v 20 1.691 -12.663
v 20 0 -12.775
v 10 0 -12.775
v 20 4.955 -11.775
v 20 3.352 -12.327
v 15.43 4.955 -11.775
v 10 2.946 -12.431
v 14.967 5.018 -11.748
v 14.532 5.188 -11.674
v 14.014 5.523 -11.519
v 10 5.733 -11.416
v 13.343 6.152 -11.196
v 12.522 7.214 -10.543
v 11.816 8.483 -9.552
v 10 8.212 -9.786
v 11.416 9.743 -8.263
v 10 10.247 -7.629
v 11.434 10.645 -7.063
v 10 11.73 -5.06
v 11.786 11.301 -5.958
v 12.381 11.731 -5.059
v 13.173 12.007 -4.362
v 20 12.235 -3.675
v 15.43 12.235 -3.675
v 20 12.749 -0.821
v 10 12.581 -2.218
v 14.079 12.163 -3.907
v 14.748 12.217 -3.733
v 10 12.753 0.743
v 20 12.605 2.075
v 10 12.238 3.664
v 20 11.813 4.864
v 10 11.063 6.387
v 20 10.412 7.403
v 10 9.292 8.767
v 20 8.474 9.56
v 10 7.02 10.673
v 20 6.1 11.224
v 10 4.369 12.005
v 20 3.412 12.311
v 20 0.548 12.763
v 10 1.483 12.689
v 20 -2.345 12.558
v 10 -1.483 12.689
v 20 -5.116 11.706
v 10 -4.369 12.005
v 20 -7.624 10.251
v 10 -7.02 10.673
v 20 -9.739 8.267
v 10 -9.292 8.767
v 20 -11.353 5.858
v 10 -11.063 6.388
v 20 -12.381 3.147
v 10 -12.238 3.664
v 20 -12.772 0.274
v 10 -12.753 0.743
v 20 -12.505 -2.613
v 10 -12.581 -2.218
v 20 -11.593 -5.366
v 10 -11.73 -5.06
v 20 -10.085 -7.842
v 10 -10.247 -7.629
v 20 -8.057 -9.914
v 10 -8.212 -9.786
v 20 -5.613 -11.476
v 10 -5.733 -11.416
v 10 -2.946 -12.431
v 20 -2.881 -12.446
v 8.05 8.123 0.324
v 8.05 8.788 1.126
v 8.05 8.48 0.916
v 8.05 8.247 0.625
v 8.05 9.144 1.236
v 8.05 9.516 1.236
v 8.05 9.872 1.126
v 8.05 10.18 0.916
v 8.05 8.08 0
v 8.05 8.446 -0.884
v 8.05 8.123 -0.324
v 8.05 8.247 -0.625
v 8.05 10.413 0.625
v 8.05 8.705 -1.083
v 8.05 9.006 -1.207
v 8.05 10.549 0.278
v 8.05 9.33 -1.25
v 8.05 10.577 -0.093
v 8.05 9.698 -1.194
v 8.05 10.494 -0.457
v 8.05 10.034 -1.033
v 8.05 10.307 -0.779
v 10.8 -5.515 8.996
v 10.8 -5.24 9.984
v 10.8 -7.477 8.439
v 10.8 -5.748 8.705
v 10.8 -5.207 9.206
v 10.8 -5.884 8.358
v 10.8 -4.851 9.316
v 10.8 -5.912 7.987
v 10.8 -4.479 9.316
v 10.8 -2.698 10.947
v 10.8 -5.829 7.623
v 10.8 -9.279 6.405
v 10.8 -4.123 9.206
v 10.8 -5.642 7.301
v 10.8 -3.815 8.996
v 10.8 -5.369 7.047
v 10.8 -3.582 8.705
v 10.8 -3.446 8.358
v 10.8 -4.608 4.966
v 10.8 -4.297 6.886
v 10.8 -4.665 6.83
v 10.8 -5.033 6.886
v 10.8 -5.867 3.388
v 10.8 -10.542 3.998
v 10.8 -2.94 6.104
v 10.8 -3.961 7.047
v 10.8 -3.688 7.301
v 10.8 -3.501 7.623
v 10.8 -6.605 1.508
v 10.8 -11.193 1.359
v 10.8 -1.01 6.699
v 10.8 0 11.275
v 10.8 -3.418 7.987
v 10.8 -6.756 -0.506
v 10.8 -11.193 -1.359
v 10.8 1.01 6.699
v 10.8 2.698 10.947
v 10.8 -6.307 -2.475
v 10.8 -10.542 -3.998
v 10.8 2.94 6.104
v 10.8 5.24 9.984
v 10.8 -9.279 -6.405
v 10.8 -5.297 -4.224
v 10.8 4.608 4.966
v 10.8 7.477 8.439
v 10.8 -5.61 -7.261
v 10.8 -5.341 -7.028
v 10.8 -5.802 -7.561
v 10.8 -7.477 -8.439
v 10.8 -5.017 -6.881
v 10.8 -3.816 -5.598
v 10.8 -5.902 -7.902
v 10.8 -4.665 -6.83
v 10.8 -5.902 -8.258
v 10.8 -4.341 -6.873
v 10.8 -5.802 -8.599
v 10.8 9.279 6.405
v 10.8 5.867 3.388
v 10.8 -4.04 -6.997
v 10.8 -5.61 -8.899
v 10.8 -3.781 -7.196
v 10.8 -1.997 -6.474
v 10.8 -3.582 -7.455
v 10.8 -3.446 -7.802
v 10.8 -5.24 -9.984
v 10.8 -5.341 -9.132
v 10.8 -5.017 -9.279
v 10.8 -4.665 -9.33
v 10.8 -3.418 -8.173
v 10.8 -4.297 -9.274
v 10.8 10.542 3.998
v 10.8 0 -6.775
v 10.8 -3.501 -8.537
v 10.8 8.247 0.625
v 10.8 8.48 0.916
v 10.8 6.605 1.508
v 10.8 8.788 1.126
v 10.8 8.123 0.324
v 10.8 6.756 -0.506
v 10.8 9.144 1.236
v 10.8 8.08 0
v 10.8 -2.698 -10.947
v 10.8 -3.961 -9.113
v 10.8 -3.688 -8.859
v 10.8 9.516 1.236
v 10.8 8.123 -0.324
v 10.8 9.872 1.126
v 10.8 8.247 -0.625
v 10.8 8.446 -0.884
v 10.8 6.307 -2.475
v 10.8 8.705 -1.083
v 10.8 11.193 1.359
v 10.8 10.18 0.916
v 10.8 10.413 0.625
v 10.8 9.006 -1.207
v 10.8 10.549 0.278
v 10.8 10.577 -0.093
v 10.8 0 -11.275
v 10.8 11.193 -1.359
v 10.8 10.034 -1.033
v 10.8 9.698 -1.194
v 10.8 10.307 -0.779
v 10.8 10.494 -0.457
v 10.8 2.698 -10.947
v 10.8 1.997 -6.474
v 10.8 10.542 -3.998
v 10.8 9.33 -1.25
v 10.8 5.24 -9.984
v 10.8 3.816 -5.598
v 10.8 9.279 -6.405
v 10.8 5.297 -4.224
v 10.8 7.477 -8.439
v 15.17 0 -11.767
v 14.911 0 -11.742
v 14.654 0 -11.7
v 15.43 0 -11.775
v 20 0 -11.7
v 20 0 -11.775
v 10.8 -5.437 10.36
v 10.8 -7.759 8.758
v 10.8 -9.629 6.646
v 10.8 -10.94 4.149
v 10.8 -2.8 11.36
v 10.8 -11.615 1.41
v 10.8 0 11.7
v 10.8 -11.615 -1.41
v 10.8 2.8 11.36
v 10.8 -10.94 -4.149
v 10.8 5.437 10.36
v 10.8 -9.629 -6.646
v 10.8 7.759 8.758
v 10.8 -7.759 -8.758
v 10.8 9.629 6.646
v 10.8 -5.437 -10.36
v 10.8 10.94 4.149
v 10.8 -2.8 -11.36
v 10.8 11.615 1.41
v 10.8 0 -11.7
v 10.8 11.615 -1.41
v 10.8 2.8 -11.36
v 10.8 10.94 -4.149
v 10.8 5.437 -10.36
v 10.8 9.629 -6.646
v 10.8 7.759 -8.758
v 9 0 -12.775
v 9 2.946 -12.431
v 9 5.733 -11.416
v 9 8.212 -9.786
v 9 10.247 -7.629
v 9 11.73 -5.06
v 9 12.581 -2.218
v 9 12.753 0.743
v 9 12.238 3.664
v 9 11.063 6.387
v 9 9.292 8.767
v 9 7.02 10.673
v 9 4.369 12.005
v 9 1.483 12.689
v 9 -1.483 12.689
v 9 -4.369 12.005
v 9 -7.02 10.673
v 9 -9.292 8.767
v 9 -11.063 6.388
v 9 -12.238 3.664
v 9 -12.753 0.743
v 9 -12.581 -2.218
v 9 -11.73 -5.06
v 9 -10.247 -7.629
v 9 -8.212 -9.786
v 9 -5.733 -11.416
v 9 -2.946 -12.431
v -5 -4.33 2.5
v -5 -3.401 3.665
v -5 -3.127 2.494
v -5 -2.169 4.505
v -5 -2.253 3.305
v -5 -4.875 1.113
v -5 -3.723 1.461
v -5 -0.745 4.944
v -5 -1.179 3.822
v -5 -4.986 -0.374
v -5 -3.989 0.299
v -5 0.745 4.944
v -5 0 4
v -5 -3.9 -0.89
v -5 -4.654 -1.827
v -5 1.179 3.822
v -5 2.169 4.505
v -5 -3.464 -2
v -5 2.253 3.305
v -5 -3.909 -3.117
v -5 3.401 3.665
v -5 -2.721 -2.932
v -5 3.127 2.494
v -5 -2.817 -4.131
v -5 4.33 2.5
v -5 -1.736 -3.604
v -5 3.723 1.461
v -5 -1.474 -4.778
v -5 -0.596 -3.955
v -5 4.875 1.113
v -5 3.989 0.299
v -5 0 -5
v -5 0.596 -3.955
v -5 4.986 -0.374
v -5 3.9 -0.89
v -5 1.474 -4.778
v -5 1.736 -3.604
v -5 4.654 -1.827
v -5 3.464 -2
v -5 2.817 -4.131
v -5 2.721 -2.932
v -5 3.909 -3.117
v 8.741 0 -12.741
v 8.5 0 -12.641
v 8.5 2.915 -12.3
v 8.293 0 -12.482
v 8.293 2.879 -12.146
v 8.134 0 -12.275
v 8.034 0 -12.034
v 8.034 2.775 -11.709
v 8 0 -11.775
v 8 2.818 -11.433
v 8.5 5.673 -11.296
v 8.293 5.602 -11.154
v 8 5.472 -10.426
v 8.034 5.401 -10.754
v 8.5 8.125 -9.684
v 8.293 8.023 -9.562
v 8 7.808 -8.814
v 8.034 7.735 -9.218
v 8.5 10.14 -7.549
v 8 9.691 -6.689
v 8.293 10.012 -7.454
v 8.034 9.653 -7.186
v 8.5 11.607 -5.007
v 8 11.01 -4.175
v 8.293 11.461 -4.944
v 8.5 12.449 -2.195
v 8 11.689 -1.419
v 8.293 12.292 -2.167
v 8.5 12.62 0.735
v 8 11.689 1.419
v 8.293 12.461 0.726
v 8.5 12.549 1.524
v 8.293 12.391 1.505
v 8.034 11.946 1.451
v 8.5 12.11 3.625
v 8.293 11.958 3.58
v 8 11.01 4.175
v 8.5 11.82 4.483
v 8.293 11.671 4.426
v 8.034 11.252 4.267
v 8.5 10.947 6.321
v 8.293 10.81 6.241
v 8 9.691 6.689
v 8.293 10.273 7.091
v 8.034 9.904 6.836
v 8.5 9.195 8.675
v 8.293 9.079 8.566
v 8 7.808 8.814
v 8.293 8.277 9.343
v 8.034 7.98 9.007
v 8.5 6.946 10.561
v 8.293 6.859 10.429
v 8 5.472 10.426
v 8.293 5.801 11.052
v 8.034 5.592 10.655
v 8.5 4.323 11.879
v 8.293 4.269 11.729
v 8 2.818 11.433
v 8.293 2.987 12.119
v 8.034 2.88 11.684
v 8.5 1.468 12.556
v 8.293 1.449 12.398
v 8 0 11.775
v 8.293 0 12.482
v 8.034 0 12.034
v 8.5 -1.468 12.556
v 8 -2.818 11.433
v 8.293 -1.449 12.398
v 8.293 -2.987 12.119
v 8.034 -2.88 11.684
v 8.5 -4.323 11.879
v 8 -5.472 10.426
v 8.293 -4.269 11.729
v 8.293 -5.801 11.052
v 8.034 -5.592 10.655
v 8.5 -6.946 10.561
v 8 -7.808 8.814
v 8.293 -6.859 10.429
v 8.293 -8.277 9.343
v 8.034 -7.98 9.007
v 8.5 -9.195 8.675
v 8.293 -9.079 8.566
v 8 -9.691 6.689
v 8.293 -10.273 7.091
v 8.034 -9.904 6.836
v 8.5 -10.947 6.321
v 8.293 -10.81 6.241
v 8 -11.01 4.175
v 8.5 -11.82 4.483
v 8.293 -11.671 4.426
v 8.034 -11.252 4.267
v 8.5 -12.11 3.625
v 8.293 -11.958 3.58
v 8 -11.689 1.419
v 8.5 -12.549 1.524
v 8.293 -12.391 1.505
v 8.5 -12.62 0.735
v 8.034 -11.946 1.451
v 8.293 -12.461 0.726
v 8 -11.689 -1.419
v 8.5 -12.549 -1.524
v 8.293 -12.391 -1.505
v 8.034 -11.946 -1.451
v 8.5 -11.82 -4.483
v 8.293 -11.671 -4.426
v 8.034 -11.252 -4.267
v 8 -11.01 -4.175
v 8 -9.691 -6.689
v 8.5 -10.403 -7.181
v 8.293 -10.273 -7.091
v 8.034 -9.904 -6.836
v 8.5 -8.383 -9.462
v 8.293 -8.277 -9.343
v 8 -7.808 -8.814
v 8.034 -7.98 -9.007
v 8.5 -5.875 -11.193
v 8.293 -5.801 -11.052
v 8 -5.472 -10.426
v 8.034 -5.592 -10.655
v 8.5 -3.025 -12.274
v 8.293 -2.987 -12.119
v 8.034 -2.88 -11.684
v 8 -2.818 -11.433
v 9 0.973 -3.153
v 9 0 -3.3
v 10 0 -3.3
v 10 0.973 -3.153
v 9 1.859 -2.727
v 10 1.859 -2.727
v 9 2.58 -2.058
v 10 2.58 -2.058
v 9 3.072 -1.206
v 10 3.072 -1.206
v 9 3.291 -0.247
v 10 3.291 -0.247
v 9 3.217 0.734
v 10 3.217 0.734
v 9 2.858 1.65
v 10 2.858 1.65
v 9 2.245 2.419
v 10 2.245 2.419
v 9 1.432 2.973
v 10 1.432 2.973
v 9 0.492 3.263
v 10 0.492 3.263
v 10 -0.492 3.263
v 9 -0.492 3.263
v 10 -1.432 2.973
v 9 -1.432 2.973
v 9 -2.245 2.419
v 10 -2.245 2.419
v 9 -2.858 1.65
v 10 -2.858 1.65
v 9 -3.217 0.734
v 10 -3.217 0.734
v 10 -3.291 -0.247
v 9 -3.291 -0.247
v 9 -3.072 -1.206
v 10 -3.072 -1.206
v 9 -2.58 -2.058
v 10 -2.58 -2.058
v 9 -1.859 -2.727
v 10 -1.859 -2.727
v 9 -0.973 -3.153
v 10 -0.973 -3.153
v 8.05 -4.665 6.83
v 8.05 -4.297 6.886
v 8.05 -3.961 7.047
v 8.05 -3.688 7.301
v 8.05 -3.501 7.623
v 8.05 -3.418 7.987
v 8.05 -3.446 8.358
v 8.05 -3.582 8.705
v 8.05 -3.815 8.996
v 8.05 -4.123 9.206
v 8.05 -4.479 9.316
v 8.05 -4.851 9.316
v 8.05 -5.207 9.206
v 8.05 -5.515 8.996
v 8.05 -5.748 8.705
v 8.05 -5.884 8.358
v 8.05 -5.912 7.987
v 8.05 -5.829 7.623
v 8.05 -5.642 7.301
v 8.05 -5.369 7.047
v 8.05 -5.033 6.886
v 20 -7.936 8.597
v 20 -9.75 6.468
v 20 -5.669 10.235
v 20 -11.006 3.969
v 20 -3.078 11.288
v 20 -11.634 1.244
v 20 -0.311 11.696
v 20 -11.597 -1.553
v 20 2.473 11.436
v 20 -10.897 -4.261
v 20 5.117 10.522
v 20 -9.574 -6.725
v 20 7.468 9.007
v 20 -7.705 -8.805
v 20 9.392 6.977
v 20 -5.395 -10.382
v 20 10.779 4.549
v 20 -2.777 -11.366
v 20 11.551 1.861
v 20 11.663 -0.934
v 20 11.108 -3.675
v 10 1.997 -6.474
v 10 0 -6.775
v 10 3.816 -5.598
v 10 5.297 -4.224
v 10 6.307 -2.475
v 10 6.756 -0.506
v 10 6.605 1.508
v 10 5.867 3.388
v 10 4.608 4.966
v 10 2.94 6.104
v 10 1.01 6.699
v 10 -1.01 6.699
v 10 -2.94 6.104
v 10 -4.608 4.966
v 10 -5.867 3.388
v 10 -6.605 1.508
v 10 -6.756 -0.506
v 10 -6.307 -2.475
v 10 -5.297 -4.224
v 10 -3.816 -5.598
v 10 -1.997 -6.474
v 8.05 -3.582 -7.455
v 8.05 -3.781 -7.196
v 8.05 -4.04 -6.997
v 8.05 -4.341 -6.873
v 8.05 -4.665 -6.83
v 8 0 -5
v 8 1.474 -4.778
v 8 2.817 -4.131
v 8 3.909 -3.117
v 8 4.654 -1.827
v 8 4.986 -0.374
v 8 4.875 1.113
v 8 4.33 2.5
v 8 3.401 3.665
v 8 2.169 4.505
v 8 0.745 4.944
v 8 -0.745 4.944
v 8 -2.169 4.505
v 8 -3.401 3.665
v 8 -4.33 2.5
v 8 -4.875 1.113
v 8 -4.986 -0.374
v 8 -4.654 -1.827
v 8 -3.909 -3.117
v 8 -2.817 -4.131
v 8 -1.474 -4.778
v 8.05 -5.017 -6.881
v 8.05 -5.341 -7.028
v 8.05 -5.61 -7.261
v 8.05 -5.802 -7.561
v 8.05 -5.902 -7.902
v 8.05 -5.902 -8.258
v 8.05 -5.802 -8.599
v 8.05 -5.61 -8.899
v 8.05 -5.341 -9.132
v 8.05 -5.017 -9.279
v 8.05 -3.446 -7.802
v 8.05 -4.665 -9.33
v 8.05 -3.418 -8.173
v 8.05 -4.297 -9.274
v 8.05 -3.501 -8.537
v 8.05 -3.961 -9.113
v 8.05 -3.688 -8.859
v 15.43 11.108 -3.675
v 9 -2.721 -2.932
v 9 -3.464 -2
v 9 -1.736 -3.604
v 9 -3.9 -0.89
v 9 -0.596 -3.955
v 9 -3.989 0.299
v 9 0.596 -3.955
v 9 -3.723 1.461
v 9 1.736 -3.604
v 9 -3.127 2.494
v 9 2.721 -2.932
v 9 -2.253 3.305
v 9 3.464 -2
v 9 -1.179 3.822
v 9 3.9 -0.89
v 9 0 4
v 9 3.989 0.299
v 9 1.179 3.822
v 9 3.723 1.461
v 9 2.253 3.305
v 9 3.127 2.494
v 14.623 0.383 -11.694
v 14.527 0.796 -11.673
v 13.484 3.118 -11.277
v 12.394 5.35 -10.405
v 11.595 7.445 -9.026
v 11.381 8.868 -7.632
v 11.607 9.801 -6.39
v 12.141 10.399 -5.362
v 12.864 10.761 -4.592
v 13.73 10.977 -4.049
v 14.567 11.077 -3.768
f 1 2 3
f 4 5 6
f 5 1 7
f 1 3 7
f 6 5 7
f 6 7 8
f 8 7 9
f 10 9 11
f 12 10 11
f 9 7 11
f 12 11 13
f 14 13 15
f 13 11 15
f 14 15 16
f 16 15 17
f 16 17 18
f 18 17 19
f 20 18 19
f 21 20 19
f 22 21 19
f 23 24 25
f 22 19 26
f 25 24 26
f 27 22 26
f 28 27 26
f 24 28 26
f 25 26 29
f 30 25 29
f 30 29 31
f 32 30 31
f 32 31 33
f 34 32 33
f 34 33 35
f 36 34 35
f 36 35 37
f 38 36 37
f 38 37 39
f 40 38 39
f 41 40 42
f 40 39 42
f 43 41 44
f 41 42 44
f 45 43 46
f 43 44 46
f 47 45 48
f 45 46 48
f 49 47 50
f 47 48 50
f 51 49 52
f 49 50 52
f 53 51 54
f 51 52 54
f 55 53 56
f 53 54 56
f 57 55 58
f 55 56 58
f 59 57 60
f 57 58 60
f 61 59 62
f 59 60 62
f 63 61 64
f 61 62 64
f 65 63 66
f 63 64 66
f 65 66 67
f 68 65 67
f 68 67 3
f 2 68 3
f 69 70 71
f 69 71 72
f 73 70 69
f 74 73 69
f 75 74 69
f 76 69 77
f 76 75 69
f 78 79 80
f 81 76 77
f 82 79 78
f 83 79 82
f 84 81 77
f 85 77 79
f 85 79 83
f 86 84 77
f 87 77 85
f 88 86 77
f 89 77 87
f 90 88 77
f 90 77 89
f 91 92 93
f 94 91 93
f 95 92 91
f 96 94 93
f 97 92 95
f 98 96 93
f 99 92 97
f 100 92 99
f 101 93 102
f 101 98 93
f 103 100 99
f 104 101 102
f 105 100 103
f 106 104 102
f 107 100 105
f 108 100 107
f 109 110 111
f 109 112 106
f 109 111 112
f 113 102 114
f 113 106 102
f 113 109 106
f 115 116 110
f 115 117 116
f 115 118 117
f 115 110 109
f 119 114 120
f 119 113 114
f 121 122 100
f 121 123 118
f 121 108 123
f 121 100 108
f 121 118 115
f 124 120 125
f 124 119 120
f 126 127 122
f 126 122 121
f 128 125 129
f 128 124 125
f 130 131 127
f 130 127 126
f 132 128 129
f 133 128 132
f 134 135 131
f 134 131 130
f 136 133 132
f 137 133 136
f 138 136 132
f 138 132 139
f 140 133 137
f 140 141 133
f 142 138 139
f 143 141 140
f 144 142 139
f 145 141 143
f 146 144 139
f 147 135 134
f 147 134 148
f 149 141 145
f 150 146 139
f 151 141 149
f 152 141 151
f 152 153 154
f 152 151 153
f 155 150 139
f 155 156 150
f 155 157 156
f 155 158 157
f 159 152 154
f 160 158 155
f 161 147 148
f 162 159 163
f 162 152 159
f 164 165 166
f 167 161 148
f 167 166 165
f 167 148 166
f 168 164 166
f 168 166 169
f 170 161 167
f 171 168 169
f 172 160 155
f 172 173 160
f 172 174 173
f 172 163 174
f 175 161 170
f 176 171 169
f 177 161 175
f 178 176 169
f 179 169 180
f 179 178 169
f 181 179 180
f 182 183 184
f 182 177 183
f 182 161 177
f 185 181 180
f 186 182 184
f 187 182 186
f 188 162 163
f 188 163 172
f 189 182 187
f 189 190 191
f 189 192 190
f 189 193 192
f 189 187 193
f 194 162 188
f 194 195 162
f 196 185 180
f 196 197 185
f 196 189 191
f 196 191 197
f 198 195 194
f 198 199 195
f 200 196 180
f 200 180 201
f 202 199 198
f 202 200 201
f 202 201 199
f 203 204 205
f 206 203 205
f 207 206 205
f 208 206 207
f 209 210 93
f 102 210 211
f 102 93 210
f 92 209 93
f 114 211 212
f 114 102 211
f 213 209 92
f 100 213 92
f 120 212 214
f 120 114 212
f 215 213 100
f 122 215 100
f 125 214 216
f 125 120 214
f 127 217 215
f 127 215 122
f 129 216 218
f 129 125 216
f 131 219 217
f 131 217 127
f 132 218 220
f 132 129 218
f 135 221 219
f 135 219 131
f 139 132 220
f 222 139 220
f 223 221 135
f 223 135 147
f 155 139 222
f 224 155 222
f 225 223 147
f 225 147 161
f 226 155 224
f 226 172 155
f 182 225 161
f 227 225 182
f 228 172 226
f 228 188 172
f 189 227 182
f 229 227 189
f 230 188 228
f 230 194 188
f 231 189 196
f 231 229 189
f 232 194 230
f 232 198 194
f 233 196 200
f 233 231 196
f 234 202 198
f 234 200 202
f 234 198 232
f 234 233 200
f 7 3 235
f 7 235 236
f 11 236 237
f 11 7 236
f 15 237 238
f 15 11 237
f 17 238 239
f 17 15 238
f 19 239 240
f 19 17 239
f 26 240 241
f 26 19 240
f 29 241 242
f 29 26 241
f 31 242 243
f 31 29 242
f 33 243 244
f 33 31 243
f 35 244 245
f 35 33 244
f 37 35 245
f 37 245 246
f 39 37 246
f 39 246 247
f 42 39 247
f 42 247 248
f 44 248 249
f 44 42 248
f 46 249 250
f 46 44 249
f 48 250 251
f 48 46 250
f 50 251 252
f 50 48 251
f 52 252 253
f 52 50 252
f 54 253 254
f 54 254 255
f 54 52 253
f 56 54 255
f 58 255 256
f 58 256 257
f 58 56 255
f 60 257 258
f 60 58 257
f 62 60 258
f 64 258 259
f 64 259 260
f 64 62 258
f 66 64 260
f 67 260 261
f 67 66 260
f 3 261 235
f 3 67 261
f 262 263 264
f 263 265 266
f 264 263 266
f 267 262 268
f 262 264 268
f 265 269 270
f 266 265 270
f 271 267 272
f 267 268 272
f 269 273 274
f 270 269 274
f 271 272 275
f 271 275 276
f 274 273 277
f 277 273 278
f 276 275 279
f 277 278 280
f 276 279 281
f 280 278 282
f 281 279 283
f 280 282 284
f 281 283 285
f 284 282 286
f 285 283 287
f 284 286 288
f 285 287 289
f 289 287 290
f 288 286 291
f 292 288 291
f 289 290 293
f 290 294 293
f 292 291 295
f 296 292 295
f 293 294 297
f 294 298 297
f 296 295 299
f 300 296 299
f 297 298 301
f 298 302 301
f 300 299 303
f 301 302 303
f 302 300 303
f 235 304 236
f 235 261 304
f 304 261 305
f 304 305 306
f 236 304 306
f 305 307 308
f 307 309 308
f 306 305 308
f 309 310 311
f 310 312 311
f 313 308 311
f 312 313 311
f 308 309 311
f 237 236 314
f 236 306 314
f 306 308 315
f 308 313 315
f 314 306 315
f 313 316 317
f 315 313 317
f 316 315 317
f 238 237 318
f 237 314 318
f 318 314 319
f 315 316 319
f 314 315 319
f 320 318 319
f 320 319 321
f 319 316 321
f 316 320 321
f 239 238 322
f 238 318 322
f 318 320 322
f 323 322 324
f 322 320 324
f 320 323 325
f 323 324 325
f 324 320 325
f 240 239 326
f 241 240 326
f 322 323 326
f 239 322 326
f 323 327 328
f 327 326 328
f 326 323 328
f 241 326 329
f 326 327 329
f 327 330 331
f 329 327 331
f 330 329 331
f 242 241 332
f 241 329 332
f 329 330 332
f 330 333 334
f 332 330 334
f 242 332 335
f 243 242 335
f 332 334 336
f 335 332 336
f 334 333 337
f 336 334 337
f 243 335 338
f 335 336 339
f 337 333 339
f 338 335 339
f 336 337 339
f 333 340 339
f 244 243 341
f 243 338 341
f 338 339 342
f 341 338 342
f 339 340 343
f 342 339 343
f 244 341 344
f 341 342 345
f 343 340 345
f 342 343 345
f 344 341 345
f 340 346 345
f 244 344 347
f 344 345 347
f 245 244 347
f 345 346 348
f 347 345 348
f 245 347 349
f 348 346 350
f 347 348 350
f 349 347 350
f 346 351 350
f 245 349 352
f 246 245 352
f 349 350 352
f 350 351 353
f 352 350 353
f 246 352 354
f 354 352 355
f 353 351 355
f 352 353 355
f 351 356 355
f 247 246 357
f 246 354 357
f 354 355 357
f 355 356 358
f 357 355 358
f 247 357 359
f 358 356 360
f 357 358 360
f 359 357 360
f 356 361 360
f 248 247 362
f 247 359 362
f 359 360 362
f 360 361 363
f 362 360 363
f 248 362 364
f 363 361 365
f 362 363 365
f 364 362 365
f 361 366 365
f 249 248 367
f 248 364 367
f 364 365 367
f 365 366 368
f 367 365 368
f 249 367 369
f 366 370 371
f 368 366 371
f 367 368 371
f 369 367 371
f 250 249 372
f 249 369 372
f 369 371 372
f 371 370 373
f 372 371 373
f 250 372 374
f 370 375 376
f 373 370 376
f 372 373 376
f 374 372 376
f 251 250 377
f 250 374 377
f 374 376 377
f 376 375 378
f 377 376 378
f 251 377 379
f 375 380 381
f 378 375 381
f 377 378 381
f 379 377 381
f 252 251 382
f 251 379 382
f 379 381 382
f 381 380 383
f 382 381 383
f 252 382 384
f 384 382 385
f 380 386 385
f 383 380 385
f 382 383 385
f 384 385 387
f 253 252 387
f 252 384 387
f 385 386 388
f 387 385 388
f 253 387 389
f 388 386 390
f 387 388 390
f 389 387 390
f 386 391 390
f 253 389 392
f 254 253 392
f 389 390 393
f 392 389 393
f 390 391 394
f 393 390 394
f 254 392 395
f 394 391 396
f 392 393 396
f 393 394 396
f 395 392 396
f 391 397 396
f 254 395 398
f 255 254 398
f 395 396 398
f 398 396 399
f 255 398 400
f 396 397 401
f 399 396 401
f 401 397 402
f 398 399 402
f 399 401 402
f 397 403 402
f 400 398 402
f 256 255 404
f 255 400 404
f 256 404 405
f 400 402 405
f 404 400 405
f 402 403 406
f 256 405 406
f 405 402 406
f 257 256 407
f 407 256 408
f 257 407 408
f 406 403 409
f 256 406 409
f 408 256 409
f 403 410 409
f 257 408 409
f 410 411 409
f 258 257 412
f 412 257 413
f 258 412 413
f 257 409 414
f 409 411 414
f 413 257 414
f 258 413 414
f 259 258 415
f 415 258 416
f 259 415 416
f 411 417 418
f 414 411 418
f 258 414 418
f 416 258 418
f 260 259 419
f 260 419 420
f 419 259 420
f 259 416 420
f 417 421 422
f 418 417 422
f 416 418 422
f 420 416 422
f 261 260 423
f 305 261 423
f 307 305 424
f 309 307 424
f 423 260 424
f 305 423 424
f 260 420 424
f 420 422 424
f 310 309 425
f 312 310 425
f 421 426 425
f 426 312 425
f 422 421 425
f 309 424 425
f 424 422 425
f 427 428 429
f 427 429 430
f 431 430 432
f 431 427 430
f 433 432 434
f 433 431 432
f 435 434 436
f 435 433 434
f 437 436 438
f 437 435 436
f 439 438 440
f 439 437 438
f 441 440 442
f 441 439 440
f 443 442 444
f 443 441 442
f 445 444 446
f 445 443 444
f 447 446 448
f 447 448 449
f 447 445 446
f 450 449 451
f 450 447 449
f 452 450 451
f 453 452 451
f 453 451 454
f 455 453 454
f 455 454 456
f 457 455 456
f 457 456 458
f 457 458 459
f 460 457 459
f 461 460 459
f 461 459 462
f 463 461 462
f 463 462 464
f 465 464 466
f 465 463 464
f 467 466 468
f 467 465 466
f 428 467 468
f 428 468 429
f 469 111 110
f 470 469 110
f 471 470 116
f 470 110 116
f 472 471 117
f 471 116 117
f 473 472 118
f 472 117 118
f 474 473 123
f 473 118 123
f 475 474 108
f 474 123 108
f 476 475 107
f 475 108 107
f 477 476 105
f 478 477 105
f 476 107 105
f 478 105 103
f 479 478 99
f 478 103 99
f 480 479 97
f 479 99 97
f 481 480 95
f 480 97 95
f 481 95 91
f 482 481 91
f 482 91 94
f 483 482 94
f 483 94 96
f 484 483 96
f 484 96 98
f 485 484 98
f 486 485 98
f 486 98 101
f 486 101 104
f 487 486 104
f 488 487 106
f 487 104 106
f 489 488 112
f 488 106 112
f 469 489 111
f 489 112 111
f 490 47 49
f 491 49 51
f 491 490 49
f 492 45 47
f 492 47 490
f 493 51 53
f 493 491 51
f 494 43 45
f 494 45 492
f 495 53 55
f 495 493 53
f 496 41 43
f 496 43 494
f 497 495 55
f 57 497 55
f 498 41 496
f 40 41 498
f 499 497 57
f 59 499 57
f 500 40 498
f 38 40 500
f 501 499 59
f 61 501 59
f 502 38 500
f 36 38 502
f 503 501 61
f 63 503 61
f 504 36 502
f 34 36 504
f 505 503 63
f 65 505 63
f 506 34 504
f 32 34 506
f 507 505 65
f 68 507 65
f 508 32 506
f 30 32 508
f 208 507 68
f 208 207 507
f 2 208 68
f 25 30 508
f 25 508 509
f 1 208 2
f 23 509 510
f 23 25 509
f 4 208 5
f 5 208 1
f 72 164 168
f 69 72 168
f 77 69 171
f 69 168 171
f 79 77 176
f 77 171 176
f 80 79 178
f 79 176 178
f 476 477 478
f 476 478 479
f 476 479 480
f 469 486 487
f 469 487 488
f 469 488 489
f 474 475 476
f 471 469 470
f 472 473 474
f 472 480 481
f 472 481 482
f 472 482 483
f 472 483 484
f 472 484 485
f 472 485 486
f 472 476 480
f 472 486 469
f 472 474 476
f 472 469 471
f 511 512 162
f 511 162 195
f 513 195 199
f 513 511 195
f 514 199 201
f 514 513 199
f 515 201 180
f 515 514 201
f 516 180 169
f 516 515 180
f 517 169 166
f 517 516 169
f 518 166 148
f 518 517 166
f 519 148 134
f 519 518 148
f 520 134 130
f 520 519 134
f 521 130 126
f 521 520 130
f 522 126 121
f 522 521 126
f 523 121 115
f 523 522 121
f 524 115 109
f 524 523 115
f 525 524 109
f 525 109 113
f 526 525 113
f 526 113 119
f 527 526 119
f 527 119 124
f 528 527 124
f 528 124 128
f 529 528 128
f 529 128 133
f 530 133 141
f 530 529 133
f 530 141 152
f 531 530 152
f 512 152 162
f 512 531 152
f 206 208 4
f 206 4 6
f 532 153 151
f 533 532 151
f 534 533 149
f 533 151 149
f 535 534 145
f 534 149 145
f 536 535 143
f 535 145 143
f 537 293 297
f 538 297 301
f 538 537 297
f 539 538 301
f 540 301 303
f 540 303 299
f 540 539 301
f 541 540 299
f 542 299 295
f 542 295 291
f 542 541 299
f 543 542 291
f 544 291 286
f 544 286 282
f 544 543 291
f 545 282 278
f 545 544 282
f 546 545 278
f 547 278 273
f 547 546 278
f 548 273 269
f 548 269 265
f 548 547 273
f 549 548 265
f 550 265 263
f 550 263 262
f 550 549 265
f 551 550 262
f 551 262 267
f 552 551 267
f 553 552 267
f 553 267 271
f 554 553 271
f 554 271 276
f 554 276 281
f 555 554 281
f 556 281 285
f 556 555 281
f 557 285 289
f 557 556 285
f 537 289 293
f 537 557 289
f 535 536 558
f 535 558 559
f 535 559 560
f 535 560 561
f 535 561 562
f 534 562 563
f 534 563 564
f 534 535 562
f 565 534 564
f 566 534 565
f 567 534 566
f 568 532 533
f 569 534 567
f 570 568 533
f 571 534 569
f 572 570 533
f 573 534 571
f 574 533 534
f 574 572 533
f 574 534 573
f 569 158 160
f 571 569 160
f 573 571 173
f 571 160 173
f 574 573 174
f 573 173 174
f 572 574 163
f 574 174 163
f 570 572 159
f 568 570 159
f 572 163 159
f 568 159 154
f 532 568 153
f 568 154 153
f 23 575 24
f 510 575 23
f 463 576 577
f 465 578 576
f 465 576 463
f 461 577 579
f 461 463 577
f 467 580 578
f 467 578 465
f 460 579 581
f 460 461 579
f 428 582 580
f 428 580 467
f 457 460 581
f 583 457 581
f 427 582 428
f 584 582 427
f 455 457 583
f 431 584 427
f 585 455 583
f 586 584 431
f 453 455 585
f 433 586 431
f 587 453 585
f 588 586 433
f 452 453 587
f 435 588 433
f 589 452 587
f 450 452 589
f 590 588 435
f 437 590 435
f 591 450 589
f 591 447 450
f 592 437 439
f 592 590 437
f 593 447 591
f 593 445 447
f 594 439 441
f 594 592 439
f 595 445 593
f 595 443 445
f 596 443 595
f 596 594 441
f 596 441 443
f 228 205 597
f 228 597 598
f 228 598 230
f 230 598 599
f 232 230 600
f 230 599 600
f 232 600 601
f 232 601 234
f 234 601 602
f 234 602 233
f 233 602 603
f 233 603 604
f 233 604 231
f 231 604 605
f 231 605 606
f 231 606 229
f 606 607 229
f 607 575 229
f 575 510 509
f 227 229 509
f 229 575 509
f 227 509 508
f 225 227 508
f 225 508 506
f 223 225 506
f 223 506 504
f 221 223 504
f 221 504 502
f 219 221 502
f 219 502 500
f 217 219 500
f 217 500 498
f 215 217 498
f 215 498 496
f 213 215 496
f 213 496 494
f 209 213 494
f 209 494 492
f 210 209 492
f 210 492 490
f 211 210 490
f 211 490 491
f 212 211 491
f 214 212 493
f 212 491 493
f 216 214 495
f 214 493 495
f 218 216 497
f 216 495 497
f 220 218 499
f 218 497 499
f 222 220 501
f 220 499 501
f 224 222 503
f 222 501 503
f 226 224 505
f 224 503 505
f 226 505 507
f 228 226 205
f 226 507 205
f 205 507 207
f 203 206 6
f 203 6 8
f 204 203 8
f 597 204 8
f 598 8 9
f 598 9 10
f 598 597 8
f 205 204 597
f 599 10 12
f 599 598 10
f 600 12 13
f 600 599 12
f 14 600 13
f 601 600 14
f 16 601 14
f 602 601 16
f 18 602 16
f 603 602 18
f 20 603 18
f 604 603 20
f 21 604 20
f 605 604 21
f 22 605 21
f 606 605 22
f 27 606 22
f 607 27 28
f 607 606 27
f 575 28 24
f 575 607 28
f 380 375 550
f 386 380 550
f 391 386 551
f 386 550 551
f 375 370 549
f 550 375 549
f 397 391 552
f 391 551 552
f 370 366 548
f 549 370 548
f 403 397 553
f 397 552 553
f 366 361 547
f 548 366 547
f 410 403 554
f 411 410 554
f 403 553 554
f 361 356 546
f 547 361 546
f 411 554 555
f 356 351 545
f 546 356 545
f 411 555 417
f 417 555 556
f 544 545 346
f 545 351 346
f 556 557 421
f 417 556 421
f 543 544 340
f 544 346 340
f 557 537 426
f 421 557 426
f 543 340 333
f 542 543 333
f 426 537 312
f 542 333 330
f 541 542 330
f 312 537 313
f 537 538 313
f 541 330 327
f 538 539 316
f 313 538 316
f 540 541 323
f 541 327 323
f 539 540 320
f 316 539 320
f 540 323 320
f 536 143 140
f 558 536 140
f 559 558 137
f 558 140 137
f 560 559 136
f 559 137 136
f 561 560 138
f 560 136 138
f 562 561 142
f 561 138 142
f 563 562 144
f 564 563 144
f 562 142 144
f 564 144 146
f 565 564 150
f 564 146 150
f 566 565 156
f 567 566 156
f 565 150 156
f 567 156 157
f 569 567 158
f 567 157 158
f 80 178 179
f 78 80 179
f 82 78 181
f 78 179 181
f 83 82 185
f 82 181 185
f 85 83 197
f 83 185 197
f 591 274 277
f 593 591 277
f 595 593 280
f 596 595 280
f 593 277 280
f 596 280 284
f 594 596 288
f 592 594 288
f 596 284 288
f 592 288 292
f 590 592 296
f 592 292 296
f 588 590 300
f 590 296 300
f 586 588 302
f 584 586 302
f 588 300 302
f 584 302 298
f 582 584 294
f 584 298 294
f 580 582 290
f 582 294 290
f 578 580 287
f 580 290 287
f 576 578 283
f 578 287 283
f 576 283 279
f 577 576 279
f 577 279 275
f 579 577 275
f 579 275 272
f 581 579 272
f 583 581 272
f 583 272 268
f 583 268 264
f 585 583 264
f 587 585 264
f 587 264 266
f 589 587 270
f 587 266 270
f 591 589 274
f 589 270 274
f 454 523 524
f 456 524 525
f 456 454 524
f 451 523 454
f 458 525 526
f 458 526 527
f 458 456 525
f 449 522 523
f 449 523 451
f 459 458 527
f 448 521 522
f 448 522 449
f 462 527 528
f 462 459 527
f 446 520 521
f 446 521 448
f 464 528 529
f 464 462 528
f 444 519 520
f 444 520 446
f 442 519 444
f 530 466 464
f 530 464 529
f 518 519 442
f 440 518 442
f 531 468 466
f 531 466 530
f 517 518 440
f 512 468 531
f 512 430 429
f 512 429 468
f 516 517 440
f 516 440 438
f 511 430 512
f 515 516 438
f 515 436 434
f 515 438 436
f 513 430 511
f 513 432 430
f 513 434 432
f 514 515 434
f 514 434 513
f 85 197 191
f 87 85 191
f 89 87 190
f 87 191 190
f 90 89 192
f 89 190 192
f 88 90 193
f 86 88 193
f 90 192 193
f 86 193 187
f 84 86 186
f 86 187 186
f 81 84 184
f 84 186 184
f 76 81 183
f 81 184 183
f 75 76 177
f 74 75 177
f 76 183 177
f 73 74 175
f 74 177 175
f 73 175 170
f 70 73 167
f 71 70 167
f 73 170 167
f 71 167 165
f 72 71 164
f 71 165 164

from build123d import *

# Parameters (mm, degrees)
SKETCH3_R                = 5
SKETCH3_R_2              = 3.3
BOSS_EXTRUDE3_DEPTH      = 10
BOSS_EXTRUDE3_DEPTH_BACK = 5
SKETCH10_R               = 12.775
SKETCH10_R_2             = 3.65
BOSS_EXTRUDE5_DEPTH      = 2
SKETCH11_R               = 11.275
SKETCH11_R_2             = 6.775
BOSS_EXTRUDE6_DEPTH      = 0.8
SKETCH12_R               = 1.25
CUT_EXTRUDE2_DEPTH       = 2.75
FILLET3_R                = 1
SKETCH13_R               = 12.775
SKETCH13_R_2             = 11.275
BOSS_EXTRUDE7_DEPTH      = 10
SKETCH14_R               = 11.7
CUT_EXTRUDE3_DEPTH       = 9.2
CUT_EXTRUDE5_DEPTH       = 16
SKETCH16_R               = 4
CUT_EXTRUDE6_DEPTH       = 14


with BuildPart() as part:
    # Sketch3 → Boss-Extrude3 (new body, two sides)
    with BuildSketch(Plane(origin=(0, 0, 0), x_dir=(0, 0, -1), z_dir=(1, 0, 0))) as boss_extrude3_sk:
        Circle(SKETCH3_R)
        Circle(SKETCH3_R_2, mode=Mode.SUBTRACT)
    extrude(amount=BOSS_EXTRUDE3_DEPTH)
    extrude(boss_extrude3_sk.sketch, amount=-BOSS_EXTRUDE3_DEPTH_BACK)

    # Sketch10 → Boss-Extrude5 (add)
    with BuildSketch(Plane(origin=(10, 0, 0), x_dir=(0, 0, -1), z_dir=(1, 0, 0))):
        Circle(SKETCH10_R)
        Circle(SKETCH10_R_2, mode=Mode.SUBTRACT)
    extrude(amount=-BOSS_EXTRUDE5_DEPTH)

    # Sketch11 → Boss-Extrude6 (add)
    with BuildSketch(Plane(origin=(10, 0, 0), x_dir=(0, 0, -1), z_dir=(1, 0, 0))):
        Circle(SKETCH11_R)
        Circle(SKETCH11_R_2, mode=Mode.SUBTRACT)
    extrude(amount=BOSS_EXTRUDE6_DEPTH)

    # Sketch12 → Cut-Extrude2 (cut)
    with BuildSketch(Plane(origin=(10.8, 0, 0), x_dir=(0, 0, -1), z_dir=(1, 0, 0))):
        with BuildLine():
            ThreePointArc((9.330017017, -4.665), (8.705017017, -3.582468245), (7.455017017, -3.582468245))
            Line((7.455017017, -3.582468245), (8.080017017, -4.665))
            Line((8.080017017, -4.665), (6.830017017, -4.665))
            ThreePointArc((6.830017017, -4.665), (8.080017017, -5.915), (9.330017017, -4.665))
        make_face()
        with BuildLine():
            Line((8.080017017, -4.665), (7.455017017, -3.582468245))
            ThreePointArc((7.455017017, -3.582468245), (6.997485263, -4.04), (6.830017017, -4.665))
            Line((6.830017017, -4.665), (8.080017017, -4.665))
        make_face()
        with BuildLine():
            Line((0.625, 8.247468245), (0, 9.33))
            Line((0, 9.33), (-0.625, 8.247468245))
            ThreePointArc((-0.625, 8.247468245), (0, 8.08), (0.625, 8.247468245))
        make_face()
        with BuildLine():
            Line((-0.625, 8.247468245), (0, 9.33))
            Line((0, 9.33), (0.625, 8.247468245))
            ThreePointArc((0.625, 8.247468245), (1.082531755, 8.705), (1.25, 9.33))
            ThreePointArc((1.25, 9.33), (-0.625, 10.412531755), (-0.625, 8.247468245))
        make_face()
        with Locations((-8.080017017, -4.665)):
            Circle(SKETCH12_R)
    extrude(amount=-CUT_EXTRUDE2_DEPTH, mode=Mode.SUBTRACT)

    # Fillet3
    fillet3_edges = [part.edges().sort_by_distance(p)[0] for p in [
        (8, 0, 12.775),
    ]]
    fillet(fillet3_edges, radius=FILLET3_R)

    # Sketch13 → Boss-Extrude7 (add)
    with BuildSketch(Plane(origin=(10, 0, 0), x_dir=(0, 0, -1), z_dir=(1, 0, 0))):
        Circle(SKETCH13_R)
        Circle(SKETCH13_R_2, mode=Mode.SUBTRACT)
    extrude(amount=BOSS_EXTRUDE7_DEPTH)

    # Sketch14 → Cut-Extrude3 (cut)
    with BuildSketch(Plane(origin=(20, 0, 0), x_dir=(0, 0, -1), z_dir=(1, 0, 0))):
        Circle(SKETCH14_R)
    extrude(amount=-CUT_EXTRUDE3_DEPTH, mode=Mode.SUBTRACT)

    # Sketch15 → Cut-Extrude5 (cut)
    with BuildSketch(Plane(origin=(0, 0, 0), x_dir=(1, 0, 0), z_dir=(0, 1, 0))):
        with BuildLine():
            Line((15.430071931, 3.675), (20, 3.675))
            Line((20, 3.675), (20, 11.775))
            Line((20, 11.775), (15.430071931, 11.775))
            ThreePointArc((15.430071931, 11.775), (11.380071931, 7.725), (15.430071931, 3.675))
        make_face()
    extrude(amount=CUT_EXTRUDE5_DEPTH, mode=Mode.SUBTRACT)

    # Sketch16 → Cut-Extrude6 (cut)
    with BuildSketch(Plane.ZY.offset(5)):
        Circle(SKETCH16_R)
    extrude(amount=-CUT_EXTRUDE6_DEPTH, mode=Mode.SUBTRACT)


solid = part.part
